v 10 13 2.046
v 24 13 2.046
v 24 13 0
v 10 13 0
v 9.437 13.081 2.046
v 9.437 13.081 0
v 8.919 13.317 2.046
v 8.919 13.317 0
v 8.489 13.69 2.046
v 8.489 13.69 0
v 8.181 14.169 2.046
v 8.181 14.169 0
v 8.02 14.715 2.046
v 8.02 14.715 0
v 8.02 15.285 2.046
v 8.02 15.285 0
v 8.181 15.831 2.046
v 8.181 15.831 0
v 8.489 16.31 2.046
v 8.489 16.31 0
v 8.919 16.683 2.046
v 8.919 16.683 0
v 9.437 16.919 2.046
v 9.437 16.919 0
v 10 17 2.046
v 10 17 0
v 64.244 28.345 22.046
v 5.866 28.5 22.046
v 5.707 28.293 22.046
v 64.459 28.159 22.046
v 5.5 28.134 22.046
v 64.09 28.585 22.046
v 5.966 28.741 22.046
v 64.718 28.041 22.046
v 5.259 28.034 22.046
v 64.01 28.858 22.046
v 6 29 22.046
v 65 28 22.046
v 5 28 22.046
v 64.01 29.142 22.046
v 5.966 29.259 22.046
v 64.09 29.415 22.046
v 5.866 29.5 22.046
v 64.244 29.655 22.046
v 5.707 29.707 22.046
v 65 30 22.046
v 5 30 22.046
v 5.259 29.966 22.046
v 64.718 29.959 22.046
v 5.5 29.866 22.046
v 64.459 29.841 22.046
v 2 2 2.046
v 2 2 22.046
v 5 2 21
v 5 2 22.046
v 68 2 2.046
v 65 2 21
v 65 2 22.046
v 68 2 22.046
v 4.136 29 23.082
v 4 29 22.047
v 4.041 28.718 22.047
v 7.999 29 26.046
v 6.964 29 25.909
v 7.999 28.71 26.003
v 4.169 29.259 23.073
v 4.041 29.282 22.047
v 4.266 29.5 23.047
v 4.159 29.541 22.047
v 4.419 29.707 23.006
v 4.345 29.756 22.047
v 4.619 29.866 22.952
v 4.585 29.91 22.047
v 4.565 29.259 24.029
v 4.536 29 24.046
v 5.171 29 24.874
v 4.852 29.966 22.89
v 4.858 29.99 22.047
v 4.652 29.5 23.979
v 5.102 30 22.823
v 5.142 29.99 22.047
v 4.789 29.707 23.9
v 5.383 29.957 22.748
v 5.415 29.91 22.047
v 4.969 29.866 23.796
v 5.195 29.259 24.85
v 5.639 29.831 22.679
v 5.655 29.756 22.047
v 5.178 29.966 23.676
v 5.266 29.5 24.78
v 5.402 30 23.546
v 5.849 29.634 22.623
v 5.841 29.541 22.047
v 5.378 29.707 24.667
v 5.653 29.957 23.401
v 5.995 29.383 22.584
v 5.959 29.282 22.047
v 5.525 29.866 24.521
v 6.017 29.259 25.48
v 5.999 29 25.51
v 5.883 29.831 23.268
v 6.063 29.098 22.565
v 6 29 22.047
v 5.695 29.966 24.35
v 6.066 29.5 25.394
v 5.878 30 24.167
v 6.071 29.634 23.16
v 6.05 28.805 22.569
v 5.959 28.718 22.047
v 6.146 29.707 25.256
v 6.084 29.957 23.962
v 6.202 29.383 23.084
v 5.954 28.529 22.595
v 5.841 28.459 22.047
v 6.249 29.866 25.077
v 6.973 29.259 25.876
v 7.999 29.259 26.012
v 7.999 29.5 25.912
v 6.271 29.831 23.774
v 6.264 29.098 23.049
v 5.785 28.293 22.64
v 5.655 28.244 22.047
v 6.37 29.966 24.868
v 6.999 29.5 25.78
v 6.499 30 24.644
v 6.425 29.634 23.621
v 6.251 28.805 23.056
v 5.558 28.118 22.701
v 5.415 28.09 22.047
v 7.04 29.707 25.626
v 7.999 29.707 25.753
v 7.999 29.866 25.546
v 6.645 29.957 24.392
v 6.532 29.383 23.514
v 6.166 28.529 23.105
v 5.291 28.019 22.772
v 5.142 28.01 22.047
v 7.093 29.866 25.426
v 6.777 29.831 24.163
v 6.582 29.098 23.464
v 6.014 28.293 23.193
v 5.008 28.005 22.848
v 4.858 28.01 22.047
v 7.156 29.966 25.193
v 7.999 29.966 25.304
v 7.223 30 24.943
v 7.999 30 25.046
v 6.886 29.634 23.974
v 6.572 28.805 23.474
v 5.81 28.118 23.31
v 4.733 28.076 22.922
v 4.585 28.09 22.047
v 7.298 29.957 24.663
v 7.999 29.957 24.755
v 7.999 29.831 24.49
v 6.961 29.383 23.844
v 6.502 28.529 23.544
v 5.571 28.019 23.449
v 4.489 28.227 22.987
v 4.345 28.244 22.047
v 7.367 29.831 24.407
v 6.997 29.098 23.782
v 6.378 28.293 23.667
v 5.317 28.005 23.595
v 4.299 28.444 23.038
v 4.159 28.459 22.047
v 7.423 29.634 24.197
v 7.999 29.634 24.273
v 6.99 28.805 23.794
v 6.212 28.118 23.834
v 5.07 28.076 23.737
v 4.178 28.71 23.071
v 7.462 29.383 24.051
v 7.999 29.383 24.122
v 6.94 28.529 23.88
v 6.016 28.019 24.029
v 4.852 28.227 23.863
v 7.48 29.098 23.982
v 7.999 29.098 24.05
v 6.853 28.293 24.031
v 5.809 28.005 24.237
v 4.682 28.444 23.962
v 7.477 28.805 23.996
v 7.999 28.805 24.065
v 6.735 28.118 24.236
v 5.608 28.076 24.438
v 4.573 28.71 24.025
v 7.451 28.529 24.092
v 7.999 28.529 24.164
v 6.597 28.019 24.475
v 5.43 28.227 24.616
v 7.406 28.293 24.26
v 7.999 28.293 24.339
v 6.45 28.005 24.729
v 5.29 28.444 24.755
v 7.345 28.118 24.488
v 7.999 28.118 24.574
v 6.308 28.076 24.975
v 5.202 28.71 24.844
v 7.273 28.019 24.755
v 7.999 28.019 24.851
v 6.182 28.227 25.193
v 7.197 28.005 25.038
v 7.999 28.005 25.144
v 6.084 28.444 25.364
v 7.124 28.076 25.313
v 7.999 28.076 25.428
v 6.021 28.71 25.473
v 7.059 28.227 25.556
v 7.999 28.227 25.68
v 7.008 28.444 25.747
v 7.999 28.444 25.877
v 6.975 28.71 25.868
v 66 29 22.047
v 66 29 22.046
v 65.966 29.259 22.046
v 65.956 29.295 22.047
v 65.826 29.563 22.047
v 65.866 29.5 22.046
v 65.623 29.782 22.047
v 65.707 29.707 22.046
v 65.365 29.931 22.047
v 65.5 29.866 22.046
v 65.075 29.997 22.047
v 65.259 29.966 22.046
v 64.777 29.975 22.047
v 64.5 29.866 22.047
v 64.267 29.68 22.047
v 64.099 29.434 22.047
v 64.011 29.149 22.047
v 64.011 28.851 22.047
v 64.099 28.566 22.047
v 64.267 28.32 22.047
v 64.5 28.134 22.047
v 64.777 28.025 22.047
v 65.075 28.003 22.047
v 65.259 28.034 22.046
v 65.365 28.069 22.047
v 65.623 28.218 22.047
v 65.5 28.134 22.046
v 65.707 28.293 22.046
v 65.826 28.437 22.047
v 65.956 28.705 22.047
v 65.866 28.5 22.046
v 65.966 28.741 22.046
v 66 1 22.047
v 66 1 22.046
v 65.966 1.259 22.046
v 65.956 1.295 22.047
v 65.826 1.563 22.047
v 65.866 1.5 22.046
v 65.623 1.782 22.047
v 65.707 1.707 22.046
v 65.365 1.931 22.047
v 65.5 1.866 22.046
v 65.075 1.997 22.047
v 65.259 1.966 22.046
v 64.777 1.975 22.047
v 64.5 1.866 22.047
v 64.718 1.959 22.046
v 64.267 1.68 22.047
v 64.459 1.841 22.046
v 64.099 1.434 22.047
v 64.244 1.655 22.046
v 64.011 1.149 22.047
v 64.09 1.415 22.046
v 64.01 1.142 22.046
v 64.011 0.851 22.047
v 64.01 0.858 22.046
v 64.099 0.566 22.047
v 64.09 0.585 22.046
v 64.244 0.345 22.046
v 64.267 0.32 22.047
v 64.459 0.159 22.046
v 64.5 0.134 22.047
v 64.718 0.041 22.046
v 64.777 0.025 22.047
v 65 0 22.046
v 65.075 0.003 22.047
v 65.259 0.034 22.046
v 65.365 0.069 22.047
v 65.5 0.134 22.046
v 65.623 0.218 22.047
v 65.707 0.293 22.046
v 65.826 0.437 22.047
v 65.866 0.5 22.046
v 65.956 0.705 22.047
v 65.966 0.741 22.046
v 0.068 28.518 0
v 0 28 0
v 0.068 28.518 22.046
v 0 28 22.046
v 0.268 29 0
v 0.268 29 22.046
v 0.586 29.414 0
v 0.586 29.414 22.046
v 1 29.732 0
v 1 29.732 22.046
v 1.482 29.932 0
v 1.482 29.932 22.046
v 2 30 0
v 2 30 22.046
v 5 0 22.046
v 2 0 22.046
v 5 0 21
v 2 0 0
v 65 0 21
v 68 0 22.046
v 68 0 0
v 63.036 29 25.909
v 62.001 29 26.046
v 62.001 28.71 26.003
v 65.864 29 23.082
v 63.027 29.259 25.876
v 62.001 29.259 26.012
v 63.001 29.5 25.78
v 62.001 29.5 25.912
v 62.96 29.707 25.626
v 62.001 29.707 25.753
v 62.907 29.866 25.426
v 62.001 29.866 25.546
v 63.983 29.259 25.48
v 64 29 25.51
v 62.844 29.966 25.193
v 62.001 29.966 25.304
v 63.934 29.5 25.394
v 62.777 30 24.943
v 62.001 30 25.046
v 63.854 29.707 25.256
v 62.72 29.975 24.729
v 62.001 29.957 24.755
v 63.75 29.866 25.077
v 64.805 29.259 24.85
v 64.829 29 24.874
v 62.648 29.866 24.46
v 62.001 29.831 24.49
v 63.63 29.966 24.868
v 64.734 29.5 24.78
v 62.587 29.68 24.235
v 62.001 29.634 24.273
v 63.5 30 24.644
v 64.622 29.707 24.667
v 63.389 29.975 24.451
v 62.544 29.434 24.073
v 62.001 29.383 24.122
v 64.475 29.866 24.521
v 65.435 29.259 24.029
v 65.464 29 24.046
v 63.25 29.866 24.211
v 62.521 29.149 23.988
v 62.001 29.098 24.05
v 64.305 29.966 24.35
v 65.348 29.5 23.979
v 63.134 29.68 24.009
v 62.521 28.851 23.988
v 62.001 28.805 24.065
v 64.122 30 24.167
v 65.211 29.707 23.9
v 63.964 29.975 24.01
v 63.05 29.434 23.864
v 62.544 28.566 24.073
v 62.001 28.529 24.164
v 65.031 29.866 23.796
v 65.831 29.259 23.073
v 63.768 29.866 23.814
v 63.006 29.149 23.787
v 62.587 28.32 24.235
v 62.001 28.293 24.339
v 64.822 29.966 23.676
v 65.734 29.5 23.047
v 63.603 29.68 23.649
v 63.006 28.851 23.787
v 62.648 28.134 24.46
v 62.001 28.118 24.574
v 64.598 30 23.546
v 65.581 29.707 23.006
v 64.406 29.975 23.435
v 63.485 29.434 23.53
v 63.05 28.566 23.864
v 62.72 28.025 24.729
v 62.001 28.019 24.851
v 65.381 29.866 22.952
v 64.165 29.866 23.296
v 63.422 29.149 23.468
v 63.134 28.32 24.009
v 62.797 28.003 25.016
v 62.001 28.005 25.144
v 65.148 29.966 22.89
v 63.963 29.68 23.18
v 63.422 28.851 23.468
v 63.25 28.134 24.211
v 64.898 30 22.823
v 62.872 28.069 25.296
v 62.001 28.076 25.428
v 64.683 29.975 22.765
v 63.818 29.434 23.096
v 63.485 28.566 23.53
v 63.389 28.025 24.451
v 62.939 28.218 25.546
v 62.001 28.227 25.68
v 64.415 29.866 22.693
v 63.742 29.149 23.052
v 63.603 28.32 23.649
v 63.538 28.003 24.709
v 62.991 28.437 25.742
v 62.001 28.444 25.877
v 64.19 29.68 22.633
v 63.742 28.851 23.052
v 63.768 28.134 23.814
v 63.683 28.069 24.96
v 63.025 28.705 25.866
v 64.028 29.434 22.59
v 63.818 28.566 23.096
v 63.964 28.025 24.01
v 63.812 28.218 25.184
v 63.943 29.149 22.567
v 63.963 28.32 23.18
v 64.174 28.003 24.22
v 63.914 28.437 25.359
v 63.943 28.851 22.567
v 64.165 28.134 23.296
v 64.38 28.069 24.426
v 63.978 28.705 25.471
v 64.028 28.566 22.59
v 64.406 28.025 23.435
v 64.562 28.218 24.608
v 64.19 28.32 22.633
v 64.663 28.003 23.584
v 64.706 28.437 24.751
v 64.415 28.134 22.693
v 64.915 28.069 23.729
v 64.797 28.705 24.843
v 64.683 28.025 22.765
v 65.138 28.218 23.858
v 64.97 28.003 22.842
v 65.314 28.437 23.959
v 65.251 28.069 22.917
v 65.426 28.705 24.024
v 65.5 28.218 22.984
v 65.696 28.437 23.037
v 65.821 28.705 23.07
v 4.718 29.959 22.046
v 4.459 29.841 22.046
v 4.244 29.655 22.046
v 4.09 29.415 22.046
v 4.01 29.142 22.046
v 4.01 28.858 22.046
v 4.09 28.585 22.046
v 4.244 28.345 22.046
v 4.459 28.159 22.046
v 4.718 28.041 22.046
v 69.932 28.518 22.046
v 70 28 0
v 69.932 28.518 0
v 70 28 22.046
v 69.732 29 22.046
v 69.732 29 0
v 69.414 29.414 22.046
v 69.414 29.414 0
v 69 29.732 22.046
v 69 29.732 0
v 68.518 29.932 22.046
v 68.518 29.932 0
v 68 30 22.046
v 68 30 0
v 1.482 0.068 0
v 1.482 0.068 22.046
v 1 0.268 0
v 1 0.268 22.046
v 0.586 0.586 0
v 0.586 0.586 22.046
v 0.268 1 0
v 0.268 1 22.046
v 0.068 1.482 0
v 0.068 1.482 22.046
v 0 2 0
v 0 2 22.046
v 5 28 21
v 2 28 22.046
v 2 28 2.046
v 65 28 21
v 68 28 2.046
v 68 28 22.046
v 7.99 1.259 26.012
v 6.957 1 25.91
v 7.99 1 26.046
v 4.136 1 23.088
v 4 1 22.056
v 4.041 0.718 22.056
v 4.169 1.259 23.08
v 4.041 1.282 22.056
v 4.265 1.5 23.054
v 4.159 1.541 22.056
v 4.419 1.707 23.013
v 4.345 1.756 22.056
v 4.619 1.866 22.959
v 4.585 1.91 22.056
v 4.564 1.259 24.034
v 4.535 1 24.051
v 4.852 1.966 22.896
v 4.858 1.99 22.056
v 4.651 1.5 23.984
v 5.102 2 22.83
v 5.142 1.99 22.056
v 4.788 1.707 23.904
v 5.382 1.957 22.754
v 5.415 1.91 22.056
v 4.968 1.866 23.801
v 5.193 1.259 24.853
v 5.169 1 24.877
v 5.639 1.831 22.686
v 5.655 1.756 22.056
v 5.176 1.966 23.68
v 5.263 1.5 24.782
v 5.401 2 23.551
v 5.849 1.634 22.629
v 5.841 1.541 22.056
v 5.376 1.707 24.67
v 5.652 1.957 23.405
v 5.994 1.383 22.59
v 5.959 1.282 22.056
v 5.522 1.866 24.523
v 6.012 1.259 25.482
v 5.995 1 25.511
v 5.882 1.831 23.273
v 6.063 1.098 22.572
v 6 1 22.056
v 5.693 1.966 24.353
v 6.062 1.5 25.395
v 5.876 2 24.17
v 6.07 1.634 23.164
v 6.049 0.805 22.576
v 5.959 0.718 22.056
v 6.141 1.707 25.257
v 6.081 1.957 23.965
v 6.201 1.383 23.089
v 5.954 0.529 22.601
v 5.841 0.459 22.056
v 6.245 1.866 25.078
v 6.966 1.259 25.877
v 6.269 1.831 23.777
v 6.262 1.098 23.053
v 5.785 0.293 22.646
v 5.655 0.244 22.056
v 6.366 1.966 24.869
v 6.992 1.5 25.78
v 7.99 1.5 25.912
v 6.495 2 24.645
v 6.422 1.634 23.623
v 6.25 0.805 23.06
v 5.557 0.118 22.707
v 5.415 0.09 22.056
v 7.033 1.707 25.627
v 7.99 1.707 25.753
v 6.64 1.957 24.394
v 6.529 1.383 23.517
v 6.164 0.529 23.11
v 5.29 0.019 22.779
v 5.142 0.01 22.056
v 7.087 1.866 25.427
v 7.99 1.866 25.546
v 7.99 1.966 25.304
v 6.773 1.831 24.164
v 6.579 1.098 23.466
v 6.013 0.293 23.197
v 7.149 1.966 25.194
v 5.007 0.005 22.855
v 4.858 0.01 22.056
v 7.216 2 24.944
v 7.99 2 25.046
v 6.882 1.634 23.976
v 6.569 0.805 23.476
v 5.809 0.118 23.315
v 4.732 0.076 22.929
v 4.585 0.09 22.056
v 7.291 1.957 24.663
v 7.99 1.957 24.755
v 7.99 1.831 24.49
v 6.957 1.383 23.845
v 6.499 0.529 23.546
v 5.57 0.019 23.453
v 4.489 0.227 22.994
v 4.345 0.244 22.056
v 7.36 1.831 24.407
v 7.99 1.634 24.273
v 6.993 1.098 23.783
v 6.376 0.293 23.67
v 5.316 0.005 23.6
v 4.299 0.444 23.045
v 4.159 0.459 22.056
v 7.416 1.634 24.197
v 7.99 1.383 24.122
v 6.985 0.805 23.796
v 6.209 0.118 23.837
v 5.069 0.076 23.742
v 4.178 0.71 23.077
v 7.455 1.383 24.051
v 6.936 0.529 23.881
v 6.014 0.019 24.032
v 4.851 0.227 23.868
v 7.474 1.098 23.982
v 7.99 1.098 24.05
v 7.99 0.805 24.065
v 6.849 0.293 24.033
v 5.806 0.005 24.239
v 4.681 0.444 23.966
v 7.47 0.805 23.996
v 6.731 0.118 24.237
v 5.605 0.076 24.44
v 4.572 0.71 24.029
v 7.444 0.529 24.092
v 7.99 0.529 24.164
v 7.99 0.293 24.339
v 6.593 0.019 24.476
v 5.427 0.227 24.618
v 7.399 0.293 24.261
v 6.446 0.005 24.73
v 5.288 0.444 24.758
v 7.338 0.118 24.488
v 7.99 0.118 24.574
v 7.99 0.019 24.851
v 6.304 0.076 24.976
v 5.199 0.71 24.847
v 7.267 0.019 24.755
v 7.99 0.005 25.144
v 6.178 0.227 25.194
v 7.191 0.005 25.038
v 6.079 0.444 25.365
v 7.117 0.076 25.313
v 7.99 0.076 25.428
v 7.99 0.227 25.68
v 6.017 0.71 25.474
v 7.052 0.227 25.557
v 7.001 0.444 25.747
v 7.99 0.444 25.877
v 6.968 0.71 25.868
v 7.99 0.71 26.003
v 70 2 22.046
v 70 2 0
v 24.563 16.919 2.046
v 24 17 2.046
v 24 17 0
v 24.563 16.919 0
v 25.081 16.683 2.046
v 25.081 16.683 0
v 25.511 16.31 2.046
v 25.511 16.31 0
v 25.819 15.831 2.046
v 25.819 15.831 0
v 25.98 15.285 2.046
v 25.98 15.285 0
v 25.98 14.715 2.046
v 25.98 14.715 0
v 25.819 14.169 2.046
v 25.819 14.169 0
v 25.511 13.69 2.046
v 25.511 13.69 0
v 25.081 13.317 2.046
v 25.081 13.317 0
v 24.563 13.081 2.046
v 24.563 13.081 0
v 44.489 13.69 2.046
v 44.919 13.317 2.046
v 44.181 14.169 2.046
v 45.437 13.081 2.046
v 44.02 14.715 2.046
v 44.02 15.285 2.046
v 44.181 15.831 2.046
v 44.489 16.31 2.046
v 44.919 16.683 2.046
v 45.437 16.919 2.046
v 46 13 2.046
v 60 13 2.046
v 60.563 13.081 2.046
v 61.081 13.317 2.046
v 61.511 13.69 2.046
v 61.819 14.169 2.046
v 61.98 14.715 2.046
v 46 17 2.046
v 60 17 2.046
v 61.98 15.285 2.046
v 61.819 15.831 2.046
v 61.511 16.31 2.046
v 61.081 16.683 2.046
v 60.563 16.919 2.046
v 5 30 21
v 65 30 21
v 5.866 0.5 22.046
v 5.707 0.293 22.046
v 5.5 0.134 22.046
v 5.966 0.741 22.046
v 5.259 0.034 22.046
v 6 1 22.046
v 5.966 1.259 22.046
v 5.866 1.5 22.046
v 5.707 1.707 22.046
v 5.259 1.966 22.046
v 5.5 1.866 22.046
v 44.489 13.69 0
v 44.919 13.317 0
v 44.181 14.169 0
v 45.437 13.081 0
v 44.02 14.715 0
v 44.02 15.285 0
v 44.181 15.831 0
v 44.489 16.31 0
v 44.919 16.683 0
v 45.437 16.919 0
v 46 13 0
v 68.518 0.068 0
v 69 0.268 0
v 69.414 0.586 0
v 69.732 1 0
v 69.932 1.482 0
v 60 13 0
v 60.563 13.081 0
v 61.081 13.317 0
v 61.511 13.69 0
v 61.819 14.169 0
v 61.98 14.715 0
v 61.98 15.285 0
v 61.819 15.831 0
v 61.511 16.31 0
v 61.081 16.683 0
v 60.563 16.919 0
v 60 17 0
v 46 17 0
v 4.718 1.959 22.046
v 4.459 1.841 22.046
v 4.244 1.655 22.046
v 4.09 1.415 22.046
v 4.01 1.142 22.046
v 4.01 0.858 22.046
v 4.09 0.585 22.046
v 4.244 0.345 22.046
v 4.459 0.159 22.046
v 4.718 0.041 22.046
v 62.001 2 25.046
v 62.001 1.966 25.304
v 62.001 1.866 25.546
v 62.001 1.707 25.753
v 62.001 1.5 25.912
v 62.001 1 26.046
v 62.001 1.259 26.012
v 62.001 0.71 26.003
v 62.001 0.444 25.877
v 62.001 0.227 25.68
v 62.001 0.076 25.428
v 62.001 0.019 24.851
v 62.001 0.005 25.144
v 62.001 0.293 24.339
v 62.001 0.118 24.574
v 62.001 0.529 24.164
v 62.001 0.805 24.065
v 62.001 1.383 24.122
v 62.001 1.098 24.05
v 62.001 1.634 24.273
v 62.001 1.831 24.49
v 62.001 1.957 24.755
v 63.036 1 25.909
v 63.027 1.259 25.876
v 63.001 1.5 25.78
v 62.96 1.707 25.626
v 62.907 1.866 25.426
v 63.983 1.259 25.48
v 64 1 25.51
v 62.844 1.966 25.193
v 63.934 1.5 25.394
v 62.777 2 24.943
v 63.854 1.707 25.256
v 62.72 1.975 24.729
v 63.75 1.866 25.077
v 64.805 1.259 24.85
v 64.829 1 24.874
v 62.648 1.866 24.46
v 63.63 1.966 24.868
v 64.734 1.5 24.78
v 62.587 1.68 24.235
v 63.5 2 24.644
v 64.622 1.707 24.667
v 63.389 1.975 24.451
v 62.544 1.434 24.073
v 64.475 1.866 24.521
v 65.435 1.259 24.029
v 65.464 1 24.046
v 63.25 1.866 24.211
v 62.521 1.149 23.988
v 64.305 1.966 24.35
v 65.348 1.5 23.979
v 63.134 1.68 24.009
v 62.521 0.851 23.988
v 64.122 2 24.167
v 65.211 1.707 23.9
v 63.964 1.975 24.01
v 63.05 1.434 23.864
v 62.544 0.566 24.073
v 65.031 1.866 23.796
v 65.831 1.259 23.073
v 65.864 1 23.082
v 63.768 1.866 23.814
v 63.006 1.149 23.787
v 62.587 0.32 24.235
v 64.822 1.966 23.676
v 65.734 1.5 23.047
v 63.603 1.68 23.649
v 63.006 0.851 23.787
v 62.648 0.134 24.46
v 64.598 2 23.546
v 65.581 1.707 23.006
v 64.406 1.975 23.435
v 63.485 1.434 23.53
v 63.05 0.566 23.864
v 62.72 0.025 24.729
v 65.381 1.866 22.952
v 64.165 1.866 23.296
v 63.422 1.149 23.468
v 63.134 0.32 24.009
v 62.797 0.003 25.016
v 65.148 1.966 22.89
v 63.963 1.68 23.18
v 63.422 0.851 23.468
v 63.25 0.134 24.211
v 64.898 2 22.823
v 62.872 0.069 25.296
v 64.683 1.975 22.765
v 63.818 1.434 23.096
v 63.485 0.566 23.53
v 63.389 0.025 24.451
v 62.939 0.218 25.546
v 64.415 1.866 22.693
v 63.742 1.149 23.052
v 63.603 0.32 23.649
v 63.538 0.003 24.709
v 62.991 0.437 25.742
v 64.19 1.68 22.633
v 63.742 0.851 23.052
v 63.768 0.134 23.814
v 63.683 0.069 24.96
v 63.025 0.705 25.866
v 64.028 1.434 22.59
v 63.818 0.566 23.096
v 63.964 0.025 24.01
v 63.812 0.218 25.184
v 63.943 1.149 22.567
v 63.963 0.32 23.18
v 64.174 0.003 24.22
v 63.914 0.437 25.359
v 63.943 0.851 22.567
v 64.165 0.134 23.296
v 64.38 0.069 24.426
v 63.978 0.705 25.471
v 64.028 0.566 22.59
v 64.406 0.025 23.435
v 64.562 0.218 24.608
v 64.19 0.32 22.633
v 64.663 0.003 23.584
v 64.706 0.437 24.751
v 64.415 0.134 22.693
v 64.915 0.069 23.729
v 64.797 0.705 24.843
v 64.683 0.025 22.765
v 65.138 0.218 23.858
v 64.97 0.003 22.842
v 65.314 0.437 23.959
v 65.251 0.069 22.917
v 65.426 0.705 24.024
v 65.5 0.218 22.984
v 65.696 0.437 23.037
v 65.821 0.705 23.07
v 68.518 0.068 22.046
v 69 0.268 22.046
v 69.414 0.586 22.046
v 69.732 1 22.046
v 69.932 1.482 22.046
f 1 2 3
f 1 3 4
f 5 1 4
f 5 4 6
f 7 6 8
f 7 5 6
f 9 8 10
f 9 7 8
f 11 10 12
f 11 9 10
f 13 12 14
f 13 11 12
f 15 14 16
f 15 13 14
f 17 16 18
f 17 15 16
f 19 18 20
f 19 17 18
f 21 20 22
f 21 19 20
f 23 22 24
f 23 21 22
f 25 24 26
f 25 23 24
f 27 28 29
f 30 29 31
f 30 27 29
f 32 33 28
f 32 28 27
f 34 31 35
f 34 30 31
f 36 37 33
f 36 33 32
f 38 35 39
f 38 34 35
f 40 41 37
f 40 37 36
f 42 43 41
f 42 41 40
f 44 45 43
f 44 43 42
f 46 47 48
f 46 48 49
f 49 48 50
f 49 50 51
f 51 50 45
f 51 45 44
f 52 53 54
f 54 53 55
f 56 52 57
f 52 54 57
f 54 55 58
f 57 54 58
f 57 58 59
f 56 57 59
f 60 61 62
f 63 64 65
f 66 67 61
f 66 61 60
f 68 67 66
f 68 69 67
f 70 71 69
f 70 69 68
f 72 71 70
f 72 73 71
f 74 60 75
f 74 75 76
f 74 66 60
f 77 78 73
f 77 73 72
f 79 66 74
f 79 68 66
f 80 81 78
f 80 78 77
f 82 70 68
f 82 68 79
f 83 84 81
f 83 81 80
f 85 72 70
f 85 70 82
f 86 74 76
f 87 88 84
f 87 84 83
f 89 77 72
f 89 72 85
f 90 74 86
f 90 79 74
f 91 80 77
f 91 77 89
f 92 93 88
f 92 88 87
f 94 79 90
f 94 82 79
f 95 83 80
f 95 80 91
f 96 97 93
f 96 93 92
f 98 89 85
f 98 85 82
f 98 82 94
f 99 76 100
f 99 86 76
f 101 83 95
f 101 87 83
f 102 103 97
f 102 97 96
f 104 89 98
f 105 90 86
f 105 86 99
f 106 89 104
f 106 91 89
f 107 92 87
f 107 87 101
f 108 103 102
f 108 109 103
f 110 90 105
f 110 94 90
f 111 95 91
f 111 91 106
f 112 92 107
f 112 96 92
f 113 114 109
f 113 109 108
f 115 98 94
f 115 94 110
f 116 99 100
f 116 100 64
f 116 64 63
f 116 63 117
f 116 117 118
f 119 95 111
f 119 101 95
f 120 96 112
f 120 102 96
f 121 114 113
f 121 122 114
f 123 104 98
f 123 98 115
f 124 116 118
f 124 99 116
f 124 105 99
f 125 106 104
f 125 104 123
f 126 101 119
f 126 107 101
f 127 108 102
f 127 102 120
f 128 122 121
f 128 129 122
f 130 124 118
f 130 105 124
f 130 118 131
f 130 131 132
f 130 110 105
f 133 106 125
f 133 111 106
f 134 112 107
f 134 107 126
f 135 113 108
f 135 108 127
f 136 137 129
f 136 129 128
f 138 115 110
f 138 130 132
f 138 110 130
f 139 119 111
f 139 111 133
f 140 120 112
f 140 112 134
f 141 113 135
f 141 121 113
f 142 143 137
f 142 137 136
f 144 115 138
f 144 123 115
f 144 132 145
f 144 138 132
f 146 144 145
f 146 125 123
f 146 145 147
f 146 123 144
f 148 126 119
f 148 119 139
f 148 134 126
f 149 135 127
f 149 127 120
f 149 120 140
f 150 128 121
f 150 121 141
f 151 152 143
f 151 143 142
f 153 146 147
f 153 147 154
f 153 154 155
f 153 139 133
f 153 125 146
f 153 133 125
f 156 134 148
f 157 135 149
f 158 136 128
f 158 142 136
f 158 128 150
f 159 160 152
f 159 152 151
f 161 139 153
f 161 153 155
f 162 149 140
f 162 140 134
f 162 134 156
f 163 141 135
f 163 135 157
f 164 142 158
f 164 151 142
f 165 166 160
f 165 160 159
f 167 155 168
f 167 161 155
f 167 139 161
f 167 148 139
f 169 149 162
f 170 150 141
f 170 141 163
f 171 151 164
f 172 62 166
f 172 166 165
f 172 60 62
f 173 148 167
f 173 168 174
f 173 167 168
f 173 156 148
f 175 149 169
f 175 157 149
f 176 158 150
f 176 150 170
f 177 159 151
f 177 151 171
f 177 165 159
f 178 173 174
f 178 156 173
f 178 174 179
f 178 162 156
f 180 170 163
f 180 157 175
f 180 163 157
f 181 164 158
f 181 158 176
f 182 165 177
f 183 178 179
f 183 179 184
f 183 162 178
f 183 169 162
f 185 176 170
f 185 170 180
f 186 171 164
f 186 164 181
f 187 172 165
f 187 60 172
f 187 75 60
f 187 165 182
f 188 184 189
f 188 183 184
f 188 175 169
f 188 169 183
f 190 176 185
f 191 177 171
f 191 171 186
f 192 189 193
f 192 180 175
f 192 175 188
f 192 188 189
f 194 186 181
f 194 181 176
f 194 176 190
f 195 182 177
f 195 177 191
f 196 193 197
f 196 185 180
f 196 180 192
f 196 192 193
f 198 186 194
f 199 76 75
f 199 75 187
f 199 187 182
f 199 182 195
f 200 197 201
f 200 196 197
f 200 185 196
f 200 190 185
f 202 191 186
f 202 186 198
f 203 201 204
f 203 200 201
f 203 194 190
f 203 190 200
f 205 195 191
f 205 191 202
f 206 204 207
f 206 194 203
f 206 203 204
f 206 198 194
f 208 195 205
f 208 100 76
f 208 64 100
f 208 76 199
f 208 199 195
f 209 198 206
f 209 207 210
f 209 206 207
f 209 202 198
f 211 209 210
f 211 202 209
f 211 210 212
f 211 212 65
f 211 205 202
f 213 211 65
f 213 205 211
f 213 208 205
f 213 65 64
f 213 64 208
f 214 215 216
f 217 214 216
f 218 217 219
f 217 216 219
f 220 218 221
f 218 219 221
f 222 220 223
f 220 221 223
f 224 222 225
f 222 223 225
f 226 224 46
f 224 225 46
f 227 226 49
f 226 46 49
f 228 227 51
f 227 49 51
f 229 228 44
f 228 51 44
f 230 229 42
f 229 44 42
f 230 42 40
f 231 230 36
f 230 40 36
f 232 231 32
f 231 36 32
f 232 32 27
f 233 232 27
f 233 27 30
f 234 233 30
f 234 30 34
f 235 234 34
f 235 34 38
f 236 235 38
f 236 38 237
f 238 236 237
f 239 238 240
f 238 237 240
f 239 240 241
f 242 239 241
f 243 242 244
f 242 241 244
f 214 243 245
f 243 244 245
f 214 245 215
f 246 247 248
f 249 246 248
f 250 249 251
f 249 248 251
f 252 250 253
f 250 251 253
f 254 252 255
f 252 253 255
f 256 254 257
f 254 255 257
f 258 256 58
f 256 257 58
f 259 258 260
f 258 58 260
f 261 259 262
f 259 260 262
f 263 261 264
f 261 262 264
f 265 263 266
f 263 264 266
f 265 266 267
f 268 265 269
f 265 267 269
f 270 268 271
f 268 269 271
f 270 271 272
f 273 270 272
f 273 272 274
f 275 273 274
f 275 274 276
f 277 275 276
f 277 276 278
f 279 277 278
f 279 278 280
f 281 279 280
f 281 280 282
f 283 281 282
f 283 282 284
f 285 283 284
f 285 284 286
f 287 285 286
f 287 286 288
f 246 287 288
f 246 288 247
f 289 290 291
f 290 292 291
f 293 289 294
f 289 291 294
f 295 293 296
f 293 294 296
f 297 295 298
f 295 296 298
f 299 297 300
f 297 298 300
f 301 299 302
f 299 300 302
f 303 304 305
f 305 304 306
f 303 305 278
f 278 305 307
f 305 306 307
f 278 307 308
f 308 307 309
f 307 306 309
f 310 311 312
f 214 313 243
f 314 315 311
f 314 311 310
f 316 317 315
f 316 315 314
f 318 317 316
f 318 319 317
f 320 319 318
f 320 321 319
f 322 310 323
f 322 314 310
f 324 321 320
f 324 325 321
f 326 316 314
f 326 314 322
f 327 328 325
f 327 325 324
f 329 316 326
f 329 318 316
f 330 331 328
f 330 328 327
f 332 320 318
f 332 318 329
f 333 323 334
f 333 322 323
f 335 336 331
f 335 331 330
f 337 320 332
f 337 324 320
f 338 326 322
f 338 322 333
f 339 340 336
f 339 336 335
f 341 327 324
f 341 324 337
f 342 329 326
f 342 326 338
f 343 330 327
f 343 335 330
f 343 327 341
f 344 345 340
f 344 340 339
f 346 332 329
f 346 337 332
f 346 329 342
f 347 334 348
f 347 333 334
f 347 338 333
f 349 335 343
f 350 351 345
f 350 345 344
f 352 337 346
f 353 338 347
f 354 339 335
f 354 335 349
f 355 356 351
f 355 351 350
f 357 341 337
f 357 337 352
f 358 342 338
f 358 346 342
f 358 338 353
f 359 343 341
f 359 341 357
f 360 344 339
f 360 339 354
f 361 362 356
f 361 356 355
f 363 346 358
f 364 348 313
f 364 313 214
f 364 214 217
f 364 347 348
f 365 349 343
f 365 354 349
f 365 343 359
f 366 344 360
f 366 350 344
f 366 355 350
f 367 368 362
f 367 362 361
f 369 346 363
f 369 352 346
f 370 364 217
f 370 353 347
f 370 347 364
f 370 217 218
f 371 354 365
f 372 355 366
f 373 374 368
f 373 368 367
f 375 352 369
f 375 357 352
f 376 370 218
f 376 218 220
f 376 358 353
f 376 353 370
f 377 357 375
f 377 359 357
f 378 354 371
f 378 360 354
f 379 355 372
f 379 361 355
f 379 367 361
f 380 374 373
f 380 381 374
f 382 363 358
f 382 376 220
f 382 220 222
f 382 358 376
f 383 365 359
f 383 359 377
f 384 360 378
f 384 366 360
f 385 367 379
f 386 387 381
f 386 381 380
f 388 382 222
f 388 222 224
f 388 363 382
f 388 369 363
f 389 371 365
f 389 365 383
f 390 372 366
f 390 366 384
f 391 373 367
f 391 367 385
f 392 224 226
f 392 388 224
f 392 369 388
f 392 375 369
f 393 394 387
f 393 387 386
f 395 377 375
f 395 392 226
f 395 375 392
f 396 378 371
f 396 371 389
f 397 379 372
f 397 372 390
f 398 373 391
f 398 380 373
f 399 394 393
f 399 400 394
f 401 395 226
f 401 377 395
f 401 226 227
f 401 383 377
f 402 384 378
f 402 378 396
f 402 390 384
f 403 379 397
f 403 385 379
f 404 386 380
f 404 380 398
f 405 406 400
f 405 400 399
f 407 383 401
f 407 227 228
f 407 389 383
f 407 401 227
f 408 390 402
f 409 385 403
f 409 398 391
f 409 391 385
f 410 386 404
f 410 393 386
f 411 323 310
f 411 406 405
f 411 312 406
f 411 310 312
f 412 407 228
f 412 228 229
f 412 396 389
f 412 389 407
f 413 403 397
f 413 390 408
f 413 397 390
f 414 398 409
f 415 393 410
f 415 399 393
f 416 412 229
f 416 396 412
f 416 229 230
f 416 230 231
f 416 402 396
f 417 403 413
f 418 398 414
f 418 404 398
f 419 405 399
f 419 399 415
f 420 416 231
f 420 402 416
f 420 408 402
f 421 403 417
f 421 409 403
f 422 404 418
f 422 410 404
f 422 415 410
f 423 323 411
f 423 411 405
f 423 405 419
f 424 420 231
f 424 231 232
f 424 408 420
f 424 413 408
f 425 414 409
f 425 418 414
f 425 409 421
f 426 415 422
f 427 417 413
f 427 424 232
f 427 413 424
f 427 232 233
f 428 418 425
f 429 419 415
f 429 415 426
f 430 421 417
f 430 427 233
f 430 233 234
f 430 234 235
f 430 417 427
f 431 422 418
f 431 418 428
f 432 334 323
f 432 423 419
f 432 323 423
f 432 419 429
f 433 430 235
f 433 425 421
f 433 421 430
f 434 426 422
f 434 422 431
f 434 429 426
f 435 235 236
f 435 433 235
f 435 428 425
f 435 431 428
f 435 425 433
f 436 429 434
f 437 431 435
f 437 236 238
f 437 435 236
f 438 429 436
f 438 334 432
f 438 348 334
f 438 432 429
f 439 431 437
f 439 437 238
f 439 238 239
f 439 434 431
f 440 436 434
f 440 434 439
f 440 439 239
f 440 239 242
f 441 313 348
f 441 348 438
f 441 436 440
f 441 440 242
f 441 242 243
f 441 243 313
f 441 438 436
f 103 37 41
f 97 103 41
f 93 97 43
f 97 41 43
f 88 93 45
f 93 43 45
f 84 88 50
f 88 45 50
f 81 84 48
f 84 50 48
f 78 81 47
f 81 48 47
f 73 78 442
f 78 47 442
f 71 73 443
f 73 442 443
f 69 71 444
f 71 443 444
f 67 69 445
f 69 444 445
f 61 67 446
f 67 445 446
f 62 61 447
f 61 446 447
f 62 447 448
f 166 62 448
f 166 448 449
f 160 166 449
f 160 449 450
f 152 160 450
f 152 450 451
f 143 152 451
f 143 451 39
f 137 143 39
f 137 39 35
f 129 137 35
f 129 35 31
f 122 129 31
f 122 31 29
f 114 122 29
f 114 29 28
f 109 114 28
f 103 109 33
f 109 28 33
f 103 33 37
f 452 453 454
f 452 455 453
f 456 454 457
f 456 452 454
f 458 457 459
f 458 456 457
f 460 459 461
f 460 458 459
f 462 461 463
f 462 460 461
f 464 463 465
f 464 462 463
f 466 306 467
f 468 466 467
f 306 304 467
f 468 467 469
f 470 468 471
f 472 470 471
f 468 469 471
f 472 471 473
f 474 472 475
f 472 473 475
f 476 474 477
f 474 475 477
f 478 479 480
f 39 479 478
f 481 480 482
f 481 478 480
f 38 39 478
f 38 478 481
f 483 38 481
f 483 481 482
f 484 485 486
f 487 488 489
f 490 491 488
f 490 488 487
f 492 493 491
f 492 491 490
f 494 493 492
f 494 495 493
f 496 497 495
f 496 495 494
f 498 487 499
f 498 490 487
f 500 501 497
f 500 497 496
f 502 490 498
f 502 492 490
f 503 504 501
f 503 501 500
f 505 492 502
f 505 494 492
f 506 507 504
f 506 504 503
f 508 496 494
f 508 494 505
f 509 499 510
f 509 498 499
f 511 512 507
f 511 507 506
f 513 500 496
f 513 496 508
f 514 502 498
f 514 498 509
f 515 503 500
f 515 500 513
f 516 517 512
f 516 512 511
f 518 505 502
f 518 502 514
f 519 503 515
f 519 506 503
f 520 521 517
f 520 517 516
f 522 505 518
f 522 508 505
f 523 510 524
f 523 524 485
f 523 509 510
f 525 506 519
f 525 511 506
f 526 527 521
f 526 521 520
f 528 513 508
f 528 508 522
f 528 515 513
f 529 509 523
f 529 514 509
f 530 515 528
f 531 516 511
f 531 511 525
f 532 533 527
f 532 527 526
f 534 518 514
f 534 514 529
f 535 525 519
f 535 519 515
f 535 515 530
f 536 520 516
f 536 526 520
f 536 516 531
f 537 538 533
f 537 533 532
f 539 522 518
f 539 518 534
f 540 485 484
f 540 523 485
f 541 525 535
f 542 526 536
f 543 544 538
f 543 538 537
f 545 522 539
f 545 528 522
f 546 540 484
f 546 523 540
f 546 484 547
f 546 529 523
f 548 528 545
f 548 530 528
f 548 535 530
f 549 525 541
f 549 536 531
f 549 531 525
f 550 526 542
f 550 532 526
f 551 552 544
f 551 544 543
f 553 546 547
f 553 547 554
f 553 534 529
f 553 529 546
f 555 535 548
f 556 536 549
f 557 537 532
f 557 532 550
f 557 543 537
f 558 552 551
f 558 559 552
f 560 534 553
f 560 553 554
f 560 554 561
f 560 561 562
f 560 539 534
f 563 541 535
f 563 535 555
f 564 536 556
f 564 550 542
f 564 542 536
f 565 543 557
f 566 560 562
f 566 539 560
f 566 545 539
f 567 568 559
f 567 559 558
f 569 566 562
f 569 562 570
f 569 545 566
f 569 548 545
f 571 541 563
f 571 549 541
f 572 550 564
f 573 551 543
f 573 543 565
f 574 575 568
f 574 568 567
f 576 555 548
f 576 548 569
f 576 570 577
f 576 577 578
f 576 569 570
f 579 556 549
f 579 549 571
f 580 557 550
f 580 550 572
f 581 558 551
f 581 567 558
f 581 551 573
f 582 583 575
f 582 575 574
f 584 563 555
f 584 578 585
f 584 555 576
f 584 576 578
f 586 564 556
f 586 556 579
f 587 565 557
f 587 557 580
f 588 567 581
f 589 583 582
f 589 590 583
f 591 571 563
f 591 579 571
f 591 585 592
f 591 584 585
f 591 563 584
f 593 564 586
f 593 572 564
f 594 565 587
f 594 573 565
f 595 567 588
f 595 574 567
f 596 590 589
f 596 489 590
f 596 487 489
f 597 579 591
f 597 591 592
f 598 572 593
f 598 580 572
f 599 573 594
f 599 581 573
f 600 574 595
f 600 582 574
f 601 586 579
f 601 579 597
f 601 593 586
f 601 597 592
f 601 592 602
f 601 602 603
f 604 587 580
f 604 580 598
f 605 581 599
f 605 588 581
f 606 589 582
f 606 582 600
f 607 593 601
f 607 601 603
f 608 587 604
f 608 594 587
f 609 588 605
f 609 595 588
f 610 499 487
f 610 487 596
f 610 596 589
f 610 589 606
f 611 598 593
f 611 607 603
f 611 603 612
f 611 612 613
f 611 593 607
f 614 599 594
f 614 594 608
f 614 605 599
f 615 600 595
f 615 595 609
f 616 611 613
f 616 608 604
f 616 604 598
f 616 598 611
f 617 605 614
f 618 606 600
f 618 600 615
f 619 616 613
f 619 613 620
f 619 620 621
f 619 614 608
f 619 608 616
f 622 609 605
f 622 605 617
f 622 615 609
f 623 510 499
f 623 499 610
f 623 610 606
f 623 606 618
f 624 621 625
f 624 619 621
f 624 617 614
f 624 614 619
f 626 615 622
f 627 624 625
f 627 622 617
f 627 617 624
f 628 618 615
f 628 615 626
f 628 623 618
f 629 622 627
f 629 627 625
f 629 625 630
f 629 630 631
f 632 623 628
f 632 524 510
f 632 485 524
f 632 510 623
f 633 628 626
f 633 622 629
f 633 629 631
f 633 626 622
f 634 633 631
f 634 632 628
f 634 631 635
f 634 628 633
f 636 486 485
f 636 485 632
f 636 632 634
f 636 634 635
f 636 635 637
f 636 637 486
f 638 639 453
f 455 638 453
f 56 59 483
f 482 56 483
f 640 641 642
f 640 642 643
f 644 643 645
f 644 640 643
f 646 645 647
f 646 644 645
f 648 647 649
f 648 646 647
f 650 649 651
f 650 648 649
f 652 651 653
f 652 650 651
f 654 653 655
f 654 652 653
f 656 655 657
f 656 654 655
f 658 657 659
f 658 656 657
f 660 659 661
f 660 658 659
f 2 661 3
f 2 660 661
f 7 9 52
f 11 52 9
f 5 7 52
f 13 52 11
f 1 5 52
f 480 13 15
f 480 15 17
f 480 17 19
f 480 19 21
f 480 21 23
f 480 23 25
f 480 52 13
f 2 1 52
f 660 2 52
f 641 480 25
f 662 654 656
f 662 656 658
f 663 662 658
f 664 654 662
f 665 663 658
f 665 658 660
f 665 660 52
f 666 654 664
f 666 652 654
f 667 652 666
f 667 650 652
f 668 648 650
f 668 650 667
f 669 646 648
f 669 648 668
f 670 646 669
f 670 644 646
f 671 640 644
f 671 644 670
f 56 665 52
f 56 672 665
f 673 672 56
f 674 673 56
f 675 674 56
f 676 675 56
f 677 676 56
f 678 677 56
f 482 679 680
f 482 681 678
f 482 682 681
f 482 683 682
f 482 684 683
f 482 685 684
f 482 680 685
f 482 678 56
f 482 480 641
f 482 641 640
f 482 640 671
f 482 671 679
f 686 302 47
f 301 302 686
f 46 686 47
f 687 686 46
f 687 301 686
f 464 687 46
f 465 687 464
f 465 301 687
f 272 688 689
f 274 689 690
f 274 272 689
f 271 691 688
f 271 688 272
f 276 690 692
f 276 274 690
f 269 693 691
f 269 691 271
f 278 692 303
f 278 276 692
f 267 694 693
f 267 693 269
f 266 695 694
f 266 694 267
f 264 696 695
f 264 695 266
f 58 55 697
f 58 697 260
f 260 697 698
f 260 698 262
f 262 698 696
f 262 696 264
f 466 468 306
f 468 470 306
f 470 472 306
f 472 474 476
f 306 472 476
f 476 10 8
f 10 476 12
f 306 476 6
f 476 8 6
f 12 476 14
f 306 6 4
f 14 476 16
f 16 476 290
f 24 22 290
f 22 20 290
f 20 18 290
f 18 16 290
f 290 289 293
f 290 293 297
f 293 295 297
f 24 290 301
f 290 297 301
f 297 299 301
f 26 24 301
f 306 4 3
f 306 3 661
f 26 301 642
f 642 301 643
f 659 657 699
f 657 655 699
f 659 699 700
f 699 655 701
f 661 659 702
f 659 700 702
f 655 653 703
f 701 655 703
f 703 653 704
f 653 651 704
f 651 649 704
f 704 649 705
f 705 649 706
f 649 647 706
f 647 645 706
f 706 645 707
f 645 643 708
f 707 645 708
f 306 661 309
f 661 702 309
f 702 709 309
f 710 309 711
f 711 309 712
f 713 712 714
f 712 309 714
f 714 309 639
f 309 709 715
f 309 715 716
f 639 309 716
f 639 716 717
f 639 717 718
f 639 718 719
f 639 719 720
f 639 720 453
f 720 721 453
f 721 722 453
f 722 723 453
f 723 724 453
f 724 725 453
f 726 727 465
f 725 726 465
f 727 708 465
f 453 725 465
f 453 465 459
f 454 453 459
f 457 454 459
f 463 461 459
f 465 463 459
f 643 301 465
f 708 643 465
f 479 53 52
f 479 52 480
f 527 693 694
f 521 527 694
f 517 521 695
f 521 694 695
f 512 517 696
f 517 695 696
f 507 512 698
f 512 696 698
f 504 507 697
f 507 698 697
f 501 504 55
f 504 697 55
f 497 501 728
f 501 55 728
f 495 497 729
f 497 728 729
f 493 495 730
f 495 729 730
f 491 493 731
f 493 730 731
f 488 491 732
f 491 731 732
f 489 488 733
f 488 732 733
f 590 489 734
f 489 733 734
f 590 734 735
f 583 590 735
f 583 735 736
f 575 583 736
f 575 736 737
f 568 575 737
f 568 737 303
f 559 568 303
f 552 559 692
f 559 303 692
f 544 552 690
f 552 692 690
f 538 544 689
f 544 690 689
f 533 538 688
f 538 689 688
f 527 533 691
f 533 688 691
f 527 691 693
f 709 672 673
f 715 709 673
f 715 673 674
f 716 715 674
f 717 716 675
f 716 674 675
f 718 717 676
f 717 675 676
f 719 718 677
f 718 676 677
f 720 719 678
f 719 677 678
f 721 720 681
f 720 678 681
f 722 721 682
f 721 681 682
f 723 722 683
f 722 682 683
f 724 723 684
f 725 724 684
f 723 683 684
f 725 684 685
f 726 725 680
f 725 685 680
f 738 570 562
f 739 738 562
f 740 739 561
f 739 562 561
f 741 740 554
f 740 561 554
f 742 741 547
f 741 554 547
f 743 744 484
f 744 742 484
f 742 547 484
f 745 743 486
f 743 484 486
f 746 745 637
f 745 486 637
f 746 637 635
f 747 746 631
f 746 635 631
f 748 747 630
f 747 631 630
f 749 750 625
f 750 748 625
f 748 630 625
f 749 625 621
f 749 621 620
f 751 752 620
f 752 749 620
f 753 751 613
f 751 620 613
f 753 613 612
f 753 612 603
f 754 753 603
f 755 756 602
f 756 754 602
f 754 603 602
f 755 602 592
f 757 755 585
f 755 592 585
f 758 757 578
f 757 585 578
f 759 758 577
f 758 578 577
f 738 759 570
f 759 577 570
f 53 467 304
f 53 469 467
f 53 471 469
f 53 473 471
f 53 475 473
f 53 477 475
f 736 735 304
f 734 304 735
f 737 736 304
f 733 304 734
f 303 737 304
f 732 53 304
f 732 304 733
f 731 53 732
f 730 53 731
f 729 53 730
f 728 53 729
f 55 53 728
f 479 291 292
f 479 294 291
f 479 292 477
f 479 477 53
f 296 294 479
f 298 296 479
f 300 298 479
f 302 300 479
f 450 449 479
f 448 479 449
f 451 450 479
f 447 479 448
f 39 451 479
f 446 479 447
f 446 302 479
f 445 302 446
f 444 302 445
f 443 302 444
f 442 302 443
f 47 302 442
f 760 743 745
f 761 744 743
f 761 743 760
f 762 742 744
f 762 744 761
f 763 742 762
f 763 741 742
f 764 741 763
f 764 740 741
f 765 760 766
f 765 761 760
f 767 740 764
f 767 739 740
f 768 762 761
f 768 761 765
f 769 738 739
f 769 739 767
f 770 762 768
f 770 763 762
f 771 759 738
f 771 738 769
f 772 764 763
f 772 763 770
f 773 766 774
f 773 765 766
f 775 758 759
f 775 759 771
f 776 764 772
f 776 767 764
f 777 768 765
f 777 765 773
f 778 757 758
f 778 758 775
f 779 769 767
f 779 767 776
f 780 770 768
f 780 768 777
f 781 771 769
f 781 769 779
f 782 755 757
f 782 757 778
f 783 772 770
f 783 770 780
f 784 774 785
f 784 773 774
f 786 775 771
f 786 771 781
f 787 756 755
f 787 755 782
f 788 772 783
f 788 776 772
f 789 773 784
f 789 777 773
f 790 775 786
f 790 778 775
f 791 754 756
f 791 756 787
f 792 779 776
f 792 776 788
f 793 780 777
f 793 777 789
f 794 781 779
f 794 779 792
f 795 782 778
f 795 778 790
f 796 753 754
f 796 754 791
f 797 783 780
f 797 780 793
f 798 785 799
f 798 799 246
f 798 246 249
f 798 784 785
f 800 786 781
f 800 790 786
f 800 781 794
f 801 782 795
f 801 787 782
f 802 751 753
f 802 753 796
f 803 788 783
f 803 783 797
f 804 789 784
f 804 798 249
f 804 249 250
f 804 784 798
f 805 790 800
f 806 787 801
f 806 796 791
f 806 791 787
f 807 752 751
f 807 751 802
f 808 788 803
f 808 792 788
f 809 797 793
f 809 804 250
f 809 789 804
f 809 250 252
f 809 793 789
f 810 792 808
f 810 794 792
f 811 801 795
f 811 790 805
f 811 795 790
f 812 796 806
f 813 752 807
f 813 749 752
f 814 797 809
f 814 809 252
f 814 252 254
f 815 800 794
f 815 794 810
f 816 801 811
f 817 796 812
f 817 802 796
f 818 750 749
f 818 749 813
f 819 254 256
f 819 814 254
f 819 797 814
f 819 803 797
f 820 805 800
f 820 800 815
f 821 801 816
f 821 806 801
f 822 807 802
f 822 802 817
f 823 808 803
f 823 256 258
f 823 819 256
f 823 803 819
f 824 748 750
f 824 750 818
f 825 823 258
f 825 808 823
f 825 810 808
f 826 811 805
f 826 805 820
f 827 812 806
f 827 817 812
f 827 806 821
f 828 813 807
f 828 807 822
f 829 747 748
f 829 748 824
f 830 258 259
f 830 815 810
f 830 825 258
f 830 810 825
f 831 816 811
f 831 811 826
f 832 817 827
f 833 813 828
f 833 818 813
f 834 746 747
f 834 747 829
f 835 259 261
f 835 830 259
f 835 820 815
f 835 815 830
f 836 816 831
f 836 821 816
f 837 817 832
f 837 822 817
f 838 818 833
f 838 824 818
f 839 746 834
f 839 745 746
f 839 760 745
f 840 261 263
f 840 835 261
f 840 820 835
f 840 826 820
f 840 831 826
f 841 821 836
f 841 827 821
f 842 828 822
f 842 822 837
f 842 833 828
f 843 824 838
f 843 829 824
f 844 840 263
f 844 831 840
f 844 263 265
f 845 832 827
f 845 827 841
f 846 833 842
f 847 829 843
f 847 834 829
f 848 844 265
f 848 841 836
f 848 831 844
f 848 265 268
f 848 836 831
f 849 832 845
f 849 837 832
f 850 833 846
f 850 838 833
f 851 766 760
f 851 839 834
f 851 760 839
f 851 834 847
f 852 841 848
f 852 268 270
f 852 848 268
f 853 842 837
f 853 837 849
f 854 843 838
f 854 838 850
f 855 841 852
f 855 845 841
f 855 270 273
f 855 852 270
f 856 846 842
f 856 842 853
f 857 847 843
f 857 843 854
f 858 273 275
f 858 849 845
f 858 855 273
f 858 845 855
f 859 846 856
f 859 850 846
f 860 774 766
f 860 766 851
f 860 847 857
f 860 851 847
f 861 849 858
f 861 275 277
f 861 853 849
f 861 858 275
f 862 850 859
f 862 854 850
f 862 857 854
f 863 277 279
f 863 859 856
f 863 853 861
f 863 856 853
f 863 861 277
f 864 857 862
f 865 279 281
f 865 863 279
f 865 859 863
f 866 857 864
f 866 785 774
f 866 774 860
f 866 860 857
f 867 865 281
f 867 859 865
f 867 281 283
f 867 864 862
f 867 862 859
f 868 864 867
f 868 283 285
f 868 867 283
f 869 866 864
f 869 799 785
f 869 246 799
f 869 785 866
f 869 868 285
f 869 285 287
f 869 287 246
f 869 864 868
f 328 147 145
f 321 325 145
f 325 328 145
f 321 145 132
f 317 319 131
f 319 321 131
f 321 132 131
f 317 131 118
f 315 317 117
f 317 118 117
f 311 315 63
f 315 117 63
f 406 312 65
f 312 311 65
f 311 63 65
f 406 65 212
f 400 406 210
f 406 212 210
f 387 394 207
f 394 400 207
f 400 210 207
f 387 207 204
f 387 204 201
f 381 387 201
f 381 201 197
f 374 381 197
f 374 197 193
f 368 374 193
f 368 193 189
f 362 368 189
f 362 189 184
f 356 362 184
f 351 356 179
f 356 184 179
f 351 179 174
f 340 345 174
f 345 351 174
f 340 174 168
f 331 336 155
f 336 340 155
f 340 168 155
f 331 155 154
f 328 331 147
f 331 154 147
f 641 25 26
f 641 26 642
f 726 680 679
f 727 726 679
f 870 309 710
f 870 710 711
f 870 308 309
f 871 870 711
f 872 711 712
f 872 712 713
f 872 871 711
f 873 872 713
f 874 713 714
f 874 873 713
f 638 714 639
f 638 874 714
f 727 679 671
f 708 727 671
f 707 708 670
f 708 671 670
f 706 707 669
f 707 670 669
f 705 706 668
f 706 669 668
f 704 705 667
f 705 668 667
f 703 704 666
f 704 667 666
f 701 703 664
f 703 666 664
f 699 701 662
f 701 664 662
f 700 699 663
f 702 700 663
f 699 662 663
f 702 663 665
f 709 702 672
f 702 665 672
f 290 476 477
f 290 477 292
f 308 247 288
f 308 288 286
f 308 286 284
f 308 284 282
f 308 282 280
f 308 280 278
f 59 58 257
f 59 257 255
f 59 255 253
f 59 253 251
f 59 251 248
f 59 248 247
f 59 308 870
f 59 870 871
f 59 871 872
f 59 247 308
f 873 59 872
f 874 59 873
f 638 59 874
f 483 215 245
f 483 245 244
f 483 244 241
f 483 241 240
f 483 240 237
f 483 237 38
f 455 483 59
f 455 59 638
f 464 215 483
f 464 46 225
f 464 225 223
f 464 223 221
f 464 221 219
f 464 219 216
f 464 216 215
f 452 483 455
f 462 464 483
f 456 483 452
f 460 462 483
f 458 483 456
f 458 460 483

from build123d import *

# Parameters (mm, degrees)
CROQUIS1_W              = 70
CROQUIS1_H              = 30
SALIENTE_EXTRUIR4_DEPTH = 22.045635187
CROQUIS5_W              = 66
CROQUIS5_H              = 26
CORTAR_EXTRUIR1_DEPTH   = 20
CORTAR_EXTRUIR3_DEPTH   = 20
REDONDEO2_R             = 2
REDONDEO3_R             = 2
REDONDEO4_R             = 2
REDONDEO5_R             = 2
BARRER8_OUTLINE_R       = 1
BARRER8_ANGLE           = 90
BARRER8_2_OUTLINE_R     = 1
BARRER8_2_ANGLE         = 90
BARRER8_START           = 21
BARRER8_3_OUTLINE_R     = 1
BARRER8_3_DEPTH         = 1.046635287
BARRER8_START_2         = 7.9899999
BARRER8_4_OUTLINE_R     = 1
BARRER8_4_DEPTH         = 54.0110002
BARRER8_5_OUTLINE_R     = 1
BARRER8_5_DEPTH         = 1.055635287
BARRER9_OUTLINE_R       = 1
BARRER9_ANGLE           = 90
BARRER9_2_OUTLINE_R     = 1
BARRER9_2_ANGLE         = 90
BARRER9_START           = 21
BARRER9_3_OUTLINE_R     = 1
BARRER9_3_DEPTH         = 1.046635287
BARRER9_START_2         = 7.9989999
BARRER9_4_OUTLINE_R     = 1
BARRER9_4_DEPTH         = 54.0020002
BARRER9_5_OUTLINE_R     = 1
BARRER9_5_DEPTH         = 1.046635287


with BuildPart() as part:
    # Croquis1 → Saliente-Extruir4 (new body)
    with BuildSketch(Plane.XY):
        with Locations((35, 15)):
            Rectangle(CROQUIS1_W, CROQUIS1_H)
    extrude(amount=SALIENTE_EXTRUIR4_DEPTH)

    # Croquis5 → Cortar-Extruir1 (cut)
    with BuildSketch(Plane.XY.offset(22.045635187)):
        with Locations((35, 15)):
            Rectangle(CROQUIS5_W, CROQUIS5_H)
    extrude(amount=-CORTAR_EXTRUIR1_DEPTH, mode=Mode.SUBTRACT)

    # Croquis6 → Cortar-Extruir3 (cut)
    with BuildSketch(Plane.XY.offset(2.045635187)):
        with BuildLine():
            Line((10, 17), (24, 17))
            ThreePointArc((24, 17), (26, 15), (24, 13))
            Line((24, 13), (10, 13))
            ThreePointArc((10, 13), (8, 15), (10, 17))
        make_face()
        with BuildLine():
            Line((60, 17), (46, 17))
            ThreePointArc((46, 17), (44, 15), (46, 13))
            Line((46, 13), (60, 13))
            ThreePointArc((60, 13), (62, 15), (60, 17))
        make_face()
    extrude(amount=-CORTAR_EXTRUIR3_DEPTH, mode=Mode.SUBTRACT)

    # Redondeo2
    redondeo2_edges = [part.edges().sort_by_distance(p)[0] for p in [
        (70, 0, 11.022817594),
    ]]
    fillet(redondeo2_edges, radius=REDONDEO2_R)

    # Redondeo3
    redondeo3_edges = [part.edges().sort_by_distance(p)[0] for p in [
        (70, 30, 11.022817594),
    ]]
    fillet(redondeo3_edges, radius=REDONDEO3_R)

    # Redondeo4
    redondeo4_edges = [part.edges().sort_by_distance(p)[0] for p in [
        (0, 0, 11.022817594),
    ]]
    fillet(redondeo4_edges, radius=REDONDEO4_R)

    # Redondeo5
    redondeo5_edges = [part.edges().sort_by_distance(p)[0] for p in [
        (0, 30, 11.022817594),
    ]]
    fillet(redondeo5_edges, radius=REDONDEO5_R)

    # Barrer8 3 outline → Barrer8 3 (add)
    with BuildSketch(Plane.XY.offset(BARRER8_START)):
        with Locations((65, 1)):
            Circle(BARRER8_3_OUTLINE_R)
    extrude(amount=BARRER8_3_DEPTH)



with BuildPart() as body_2:
    # Barrer8: read off the stored shape, not the designer's step
    # Barrer8 outline → Barrer8 (revolve)
    with BuildSketch(Plane(origin=(62.001, 0, 22.046635187), x_dir=(0, 0, 1), z_dir=(-1, 0, 0))):
        with Locations((2.999, 1)):
            Circle(BARRER8_OUTLINE_R)
    revolve(axis=Axis((62.001, 0, 22.046635187), (0, 1, 0)), revolution_arc=BARRER8_ANGLE)



with BuildPart() as body_3:
    # Barrer8 2 outline → Barrer8 2 (revolve)
    with BuildSketch(Plane(origin=(7.99, 0, 22.055635187), x_dir=(-1, 0, 0), z_dir=(0, 0, -1))):
        with Locations((2.99, 1)):
            Circle(BARRER8_2_OUTLINE_R)
    revolve(axis=Axis((7.99, 0, 22.055635187), (0, 1, 0)), revolution_arc=BARRER8_2_ANGLE)


with BuildPart() as body_2_1:
    add(body_2.part)

    add(body_3.part)  # Barrer8 4 merges body 3
    # Barrer8 4 outline → Barrer8 4 (add)
    with BuildSketch(Plane.YZ.offset(BARRER8_START_2)):
        with Locations((1, 25.045635187)):
            Circle(BARRER8_4_OUTLINE_R)
    extrude(amount=BARRER8_4_DEPTH)


with BuildPart() as part_1:
    add(part.part)

    add(body_2_1.part)  # Barrer8 5 merges body 2
    # Barrer8 5 outline → Barrer8 5 (add)
    with BuildSketch(Plane.XY.offset(BARRER8_START)):
        with Locations((5, 1)):
            Circle(BARRER8_5_OUTLINE_R)
    extrude(amount=BARRER8_5_DEPTH)

    # Barrer9 3 outline → Barrer9 3 (add)
    with BuildSketch(Plane.XY.offset(BARRER9_START)):
        with Locations((5, 29)):
            Circle(BARRER9_3_OUTLINE_R)
    extrude(amount=BARRER9_3_DEPTH)



with BuildPart() as body_2_2:
    # Barrer9: read off the stored shape, not the designer's step
    # Barrer9 outline → Barrer9 (revolve)
    with BuildSketch(Plane(origin=(7.999, 0, 22.046635187), x_dir=(-1, 0, 0), z_dir=(0, 0, -1))):
        with Locations((2.999, 29)):
            Circle(BARRER9_OUTLINE_R)
    revolve(axis=Axis((7.999, 0, 22.046635187), (0, 1, 0)), revolution_arc=BARRER9_ANGLE)



with BuildPart() as body_3_2:
    # Barrer9 2 outline → Barrer9 2 (revolve)
    with BuildSketch(Plane(origin=(62.001, 0, 22.046635187), x_dir=(0, 0, 1), z_dir=(-1, 0, 0))):
        with Locations((2.999, 29)):
            Circle(BARRER9_2_OUTLINE_R)
    revolve(axis=Axis((62.001, 0, 22.046635187), (0, 1, 0)), revolution_arc=BARRER9_2_ANGLE)


with BuildPart() as body_2_2_1:
    add(body_2_2.part)

    add(body_3_2.part)  # Barrer9 4 merges body 3 2
    # Barrer9 4 outline → Barrer9 4 (add)
    with BuildSketch(Plane.YZ.offset(BARRER9_START_2)):
        with Locations((29, 25.045635187)):
            Circle(BARRER9_4_OUTLINE_R)
    extrude(amount=BARRER9_4_DEPTH)


with BuildPart() as part_2:
    add(part_1.part)

    add(body_2_2_1.part)  # Barrer9 5 merges body 2 2
    # Barrer9 5 outline → Barrer9 5 (add)
    with BuildSketch(Plane.XY.offset(BARRER9_START)):
        with Locations((65, 29)):
            Circle(BARRER9_5_OUTLINE_R)
    extrude(amount=BARRER9_5_DEPTH)


solid = part_2.part
